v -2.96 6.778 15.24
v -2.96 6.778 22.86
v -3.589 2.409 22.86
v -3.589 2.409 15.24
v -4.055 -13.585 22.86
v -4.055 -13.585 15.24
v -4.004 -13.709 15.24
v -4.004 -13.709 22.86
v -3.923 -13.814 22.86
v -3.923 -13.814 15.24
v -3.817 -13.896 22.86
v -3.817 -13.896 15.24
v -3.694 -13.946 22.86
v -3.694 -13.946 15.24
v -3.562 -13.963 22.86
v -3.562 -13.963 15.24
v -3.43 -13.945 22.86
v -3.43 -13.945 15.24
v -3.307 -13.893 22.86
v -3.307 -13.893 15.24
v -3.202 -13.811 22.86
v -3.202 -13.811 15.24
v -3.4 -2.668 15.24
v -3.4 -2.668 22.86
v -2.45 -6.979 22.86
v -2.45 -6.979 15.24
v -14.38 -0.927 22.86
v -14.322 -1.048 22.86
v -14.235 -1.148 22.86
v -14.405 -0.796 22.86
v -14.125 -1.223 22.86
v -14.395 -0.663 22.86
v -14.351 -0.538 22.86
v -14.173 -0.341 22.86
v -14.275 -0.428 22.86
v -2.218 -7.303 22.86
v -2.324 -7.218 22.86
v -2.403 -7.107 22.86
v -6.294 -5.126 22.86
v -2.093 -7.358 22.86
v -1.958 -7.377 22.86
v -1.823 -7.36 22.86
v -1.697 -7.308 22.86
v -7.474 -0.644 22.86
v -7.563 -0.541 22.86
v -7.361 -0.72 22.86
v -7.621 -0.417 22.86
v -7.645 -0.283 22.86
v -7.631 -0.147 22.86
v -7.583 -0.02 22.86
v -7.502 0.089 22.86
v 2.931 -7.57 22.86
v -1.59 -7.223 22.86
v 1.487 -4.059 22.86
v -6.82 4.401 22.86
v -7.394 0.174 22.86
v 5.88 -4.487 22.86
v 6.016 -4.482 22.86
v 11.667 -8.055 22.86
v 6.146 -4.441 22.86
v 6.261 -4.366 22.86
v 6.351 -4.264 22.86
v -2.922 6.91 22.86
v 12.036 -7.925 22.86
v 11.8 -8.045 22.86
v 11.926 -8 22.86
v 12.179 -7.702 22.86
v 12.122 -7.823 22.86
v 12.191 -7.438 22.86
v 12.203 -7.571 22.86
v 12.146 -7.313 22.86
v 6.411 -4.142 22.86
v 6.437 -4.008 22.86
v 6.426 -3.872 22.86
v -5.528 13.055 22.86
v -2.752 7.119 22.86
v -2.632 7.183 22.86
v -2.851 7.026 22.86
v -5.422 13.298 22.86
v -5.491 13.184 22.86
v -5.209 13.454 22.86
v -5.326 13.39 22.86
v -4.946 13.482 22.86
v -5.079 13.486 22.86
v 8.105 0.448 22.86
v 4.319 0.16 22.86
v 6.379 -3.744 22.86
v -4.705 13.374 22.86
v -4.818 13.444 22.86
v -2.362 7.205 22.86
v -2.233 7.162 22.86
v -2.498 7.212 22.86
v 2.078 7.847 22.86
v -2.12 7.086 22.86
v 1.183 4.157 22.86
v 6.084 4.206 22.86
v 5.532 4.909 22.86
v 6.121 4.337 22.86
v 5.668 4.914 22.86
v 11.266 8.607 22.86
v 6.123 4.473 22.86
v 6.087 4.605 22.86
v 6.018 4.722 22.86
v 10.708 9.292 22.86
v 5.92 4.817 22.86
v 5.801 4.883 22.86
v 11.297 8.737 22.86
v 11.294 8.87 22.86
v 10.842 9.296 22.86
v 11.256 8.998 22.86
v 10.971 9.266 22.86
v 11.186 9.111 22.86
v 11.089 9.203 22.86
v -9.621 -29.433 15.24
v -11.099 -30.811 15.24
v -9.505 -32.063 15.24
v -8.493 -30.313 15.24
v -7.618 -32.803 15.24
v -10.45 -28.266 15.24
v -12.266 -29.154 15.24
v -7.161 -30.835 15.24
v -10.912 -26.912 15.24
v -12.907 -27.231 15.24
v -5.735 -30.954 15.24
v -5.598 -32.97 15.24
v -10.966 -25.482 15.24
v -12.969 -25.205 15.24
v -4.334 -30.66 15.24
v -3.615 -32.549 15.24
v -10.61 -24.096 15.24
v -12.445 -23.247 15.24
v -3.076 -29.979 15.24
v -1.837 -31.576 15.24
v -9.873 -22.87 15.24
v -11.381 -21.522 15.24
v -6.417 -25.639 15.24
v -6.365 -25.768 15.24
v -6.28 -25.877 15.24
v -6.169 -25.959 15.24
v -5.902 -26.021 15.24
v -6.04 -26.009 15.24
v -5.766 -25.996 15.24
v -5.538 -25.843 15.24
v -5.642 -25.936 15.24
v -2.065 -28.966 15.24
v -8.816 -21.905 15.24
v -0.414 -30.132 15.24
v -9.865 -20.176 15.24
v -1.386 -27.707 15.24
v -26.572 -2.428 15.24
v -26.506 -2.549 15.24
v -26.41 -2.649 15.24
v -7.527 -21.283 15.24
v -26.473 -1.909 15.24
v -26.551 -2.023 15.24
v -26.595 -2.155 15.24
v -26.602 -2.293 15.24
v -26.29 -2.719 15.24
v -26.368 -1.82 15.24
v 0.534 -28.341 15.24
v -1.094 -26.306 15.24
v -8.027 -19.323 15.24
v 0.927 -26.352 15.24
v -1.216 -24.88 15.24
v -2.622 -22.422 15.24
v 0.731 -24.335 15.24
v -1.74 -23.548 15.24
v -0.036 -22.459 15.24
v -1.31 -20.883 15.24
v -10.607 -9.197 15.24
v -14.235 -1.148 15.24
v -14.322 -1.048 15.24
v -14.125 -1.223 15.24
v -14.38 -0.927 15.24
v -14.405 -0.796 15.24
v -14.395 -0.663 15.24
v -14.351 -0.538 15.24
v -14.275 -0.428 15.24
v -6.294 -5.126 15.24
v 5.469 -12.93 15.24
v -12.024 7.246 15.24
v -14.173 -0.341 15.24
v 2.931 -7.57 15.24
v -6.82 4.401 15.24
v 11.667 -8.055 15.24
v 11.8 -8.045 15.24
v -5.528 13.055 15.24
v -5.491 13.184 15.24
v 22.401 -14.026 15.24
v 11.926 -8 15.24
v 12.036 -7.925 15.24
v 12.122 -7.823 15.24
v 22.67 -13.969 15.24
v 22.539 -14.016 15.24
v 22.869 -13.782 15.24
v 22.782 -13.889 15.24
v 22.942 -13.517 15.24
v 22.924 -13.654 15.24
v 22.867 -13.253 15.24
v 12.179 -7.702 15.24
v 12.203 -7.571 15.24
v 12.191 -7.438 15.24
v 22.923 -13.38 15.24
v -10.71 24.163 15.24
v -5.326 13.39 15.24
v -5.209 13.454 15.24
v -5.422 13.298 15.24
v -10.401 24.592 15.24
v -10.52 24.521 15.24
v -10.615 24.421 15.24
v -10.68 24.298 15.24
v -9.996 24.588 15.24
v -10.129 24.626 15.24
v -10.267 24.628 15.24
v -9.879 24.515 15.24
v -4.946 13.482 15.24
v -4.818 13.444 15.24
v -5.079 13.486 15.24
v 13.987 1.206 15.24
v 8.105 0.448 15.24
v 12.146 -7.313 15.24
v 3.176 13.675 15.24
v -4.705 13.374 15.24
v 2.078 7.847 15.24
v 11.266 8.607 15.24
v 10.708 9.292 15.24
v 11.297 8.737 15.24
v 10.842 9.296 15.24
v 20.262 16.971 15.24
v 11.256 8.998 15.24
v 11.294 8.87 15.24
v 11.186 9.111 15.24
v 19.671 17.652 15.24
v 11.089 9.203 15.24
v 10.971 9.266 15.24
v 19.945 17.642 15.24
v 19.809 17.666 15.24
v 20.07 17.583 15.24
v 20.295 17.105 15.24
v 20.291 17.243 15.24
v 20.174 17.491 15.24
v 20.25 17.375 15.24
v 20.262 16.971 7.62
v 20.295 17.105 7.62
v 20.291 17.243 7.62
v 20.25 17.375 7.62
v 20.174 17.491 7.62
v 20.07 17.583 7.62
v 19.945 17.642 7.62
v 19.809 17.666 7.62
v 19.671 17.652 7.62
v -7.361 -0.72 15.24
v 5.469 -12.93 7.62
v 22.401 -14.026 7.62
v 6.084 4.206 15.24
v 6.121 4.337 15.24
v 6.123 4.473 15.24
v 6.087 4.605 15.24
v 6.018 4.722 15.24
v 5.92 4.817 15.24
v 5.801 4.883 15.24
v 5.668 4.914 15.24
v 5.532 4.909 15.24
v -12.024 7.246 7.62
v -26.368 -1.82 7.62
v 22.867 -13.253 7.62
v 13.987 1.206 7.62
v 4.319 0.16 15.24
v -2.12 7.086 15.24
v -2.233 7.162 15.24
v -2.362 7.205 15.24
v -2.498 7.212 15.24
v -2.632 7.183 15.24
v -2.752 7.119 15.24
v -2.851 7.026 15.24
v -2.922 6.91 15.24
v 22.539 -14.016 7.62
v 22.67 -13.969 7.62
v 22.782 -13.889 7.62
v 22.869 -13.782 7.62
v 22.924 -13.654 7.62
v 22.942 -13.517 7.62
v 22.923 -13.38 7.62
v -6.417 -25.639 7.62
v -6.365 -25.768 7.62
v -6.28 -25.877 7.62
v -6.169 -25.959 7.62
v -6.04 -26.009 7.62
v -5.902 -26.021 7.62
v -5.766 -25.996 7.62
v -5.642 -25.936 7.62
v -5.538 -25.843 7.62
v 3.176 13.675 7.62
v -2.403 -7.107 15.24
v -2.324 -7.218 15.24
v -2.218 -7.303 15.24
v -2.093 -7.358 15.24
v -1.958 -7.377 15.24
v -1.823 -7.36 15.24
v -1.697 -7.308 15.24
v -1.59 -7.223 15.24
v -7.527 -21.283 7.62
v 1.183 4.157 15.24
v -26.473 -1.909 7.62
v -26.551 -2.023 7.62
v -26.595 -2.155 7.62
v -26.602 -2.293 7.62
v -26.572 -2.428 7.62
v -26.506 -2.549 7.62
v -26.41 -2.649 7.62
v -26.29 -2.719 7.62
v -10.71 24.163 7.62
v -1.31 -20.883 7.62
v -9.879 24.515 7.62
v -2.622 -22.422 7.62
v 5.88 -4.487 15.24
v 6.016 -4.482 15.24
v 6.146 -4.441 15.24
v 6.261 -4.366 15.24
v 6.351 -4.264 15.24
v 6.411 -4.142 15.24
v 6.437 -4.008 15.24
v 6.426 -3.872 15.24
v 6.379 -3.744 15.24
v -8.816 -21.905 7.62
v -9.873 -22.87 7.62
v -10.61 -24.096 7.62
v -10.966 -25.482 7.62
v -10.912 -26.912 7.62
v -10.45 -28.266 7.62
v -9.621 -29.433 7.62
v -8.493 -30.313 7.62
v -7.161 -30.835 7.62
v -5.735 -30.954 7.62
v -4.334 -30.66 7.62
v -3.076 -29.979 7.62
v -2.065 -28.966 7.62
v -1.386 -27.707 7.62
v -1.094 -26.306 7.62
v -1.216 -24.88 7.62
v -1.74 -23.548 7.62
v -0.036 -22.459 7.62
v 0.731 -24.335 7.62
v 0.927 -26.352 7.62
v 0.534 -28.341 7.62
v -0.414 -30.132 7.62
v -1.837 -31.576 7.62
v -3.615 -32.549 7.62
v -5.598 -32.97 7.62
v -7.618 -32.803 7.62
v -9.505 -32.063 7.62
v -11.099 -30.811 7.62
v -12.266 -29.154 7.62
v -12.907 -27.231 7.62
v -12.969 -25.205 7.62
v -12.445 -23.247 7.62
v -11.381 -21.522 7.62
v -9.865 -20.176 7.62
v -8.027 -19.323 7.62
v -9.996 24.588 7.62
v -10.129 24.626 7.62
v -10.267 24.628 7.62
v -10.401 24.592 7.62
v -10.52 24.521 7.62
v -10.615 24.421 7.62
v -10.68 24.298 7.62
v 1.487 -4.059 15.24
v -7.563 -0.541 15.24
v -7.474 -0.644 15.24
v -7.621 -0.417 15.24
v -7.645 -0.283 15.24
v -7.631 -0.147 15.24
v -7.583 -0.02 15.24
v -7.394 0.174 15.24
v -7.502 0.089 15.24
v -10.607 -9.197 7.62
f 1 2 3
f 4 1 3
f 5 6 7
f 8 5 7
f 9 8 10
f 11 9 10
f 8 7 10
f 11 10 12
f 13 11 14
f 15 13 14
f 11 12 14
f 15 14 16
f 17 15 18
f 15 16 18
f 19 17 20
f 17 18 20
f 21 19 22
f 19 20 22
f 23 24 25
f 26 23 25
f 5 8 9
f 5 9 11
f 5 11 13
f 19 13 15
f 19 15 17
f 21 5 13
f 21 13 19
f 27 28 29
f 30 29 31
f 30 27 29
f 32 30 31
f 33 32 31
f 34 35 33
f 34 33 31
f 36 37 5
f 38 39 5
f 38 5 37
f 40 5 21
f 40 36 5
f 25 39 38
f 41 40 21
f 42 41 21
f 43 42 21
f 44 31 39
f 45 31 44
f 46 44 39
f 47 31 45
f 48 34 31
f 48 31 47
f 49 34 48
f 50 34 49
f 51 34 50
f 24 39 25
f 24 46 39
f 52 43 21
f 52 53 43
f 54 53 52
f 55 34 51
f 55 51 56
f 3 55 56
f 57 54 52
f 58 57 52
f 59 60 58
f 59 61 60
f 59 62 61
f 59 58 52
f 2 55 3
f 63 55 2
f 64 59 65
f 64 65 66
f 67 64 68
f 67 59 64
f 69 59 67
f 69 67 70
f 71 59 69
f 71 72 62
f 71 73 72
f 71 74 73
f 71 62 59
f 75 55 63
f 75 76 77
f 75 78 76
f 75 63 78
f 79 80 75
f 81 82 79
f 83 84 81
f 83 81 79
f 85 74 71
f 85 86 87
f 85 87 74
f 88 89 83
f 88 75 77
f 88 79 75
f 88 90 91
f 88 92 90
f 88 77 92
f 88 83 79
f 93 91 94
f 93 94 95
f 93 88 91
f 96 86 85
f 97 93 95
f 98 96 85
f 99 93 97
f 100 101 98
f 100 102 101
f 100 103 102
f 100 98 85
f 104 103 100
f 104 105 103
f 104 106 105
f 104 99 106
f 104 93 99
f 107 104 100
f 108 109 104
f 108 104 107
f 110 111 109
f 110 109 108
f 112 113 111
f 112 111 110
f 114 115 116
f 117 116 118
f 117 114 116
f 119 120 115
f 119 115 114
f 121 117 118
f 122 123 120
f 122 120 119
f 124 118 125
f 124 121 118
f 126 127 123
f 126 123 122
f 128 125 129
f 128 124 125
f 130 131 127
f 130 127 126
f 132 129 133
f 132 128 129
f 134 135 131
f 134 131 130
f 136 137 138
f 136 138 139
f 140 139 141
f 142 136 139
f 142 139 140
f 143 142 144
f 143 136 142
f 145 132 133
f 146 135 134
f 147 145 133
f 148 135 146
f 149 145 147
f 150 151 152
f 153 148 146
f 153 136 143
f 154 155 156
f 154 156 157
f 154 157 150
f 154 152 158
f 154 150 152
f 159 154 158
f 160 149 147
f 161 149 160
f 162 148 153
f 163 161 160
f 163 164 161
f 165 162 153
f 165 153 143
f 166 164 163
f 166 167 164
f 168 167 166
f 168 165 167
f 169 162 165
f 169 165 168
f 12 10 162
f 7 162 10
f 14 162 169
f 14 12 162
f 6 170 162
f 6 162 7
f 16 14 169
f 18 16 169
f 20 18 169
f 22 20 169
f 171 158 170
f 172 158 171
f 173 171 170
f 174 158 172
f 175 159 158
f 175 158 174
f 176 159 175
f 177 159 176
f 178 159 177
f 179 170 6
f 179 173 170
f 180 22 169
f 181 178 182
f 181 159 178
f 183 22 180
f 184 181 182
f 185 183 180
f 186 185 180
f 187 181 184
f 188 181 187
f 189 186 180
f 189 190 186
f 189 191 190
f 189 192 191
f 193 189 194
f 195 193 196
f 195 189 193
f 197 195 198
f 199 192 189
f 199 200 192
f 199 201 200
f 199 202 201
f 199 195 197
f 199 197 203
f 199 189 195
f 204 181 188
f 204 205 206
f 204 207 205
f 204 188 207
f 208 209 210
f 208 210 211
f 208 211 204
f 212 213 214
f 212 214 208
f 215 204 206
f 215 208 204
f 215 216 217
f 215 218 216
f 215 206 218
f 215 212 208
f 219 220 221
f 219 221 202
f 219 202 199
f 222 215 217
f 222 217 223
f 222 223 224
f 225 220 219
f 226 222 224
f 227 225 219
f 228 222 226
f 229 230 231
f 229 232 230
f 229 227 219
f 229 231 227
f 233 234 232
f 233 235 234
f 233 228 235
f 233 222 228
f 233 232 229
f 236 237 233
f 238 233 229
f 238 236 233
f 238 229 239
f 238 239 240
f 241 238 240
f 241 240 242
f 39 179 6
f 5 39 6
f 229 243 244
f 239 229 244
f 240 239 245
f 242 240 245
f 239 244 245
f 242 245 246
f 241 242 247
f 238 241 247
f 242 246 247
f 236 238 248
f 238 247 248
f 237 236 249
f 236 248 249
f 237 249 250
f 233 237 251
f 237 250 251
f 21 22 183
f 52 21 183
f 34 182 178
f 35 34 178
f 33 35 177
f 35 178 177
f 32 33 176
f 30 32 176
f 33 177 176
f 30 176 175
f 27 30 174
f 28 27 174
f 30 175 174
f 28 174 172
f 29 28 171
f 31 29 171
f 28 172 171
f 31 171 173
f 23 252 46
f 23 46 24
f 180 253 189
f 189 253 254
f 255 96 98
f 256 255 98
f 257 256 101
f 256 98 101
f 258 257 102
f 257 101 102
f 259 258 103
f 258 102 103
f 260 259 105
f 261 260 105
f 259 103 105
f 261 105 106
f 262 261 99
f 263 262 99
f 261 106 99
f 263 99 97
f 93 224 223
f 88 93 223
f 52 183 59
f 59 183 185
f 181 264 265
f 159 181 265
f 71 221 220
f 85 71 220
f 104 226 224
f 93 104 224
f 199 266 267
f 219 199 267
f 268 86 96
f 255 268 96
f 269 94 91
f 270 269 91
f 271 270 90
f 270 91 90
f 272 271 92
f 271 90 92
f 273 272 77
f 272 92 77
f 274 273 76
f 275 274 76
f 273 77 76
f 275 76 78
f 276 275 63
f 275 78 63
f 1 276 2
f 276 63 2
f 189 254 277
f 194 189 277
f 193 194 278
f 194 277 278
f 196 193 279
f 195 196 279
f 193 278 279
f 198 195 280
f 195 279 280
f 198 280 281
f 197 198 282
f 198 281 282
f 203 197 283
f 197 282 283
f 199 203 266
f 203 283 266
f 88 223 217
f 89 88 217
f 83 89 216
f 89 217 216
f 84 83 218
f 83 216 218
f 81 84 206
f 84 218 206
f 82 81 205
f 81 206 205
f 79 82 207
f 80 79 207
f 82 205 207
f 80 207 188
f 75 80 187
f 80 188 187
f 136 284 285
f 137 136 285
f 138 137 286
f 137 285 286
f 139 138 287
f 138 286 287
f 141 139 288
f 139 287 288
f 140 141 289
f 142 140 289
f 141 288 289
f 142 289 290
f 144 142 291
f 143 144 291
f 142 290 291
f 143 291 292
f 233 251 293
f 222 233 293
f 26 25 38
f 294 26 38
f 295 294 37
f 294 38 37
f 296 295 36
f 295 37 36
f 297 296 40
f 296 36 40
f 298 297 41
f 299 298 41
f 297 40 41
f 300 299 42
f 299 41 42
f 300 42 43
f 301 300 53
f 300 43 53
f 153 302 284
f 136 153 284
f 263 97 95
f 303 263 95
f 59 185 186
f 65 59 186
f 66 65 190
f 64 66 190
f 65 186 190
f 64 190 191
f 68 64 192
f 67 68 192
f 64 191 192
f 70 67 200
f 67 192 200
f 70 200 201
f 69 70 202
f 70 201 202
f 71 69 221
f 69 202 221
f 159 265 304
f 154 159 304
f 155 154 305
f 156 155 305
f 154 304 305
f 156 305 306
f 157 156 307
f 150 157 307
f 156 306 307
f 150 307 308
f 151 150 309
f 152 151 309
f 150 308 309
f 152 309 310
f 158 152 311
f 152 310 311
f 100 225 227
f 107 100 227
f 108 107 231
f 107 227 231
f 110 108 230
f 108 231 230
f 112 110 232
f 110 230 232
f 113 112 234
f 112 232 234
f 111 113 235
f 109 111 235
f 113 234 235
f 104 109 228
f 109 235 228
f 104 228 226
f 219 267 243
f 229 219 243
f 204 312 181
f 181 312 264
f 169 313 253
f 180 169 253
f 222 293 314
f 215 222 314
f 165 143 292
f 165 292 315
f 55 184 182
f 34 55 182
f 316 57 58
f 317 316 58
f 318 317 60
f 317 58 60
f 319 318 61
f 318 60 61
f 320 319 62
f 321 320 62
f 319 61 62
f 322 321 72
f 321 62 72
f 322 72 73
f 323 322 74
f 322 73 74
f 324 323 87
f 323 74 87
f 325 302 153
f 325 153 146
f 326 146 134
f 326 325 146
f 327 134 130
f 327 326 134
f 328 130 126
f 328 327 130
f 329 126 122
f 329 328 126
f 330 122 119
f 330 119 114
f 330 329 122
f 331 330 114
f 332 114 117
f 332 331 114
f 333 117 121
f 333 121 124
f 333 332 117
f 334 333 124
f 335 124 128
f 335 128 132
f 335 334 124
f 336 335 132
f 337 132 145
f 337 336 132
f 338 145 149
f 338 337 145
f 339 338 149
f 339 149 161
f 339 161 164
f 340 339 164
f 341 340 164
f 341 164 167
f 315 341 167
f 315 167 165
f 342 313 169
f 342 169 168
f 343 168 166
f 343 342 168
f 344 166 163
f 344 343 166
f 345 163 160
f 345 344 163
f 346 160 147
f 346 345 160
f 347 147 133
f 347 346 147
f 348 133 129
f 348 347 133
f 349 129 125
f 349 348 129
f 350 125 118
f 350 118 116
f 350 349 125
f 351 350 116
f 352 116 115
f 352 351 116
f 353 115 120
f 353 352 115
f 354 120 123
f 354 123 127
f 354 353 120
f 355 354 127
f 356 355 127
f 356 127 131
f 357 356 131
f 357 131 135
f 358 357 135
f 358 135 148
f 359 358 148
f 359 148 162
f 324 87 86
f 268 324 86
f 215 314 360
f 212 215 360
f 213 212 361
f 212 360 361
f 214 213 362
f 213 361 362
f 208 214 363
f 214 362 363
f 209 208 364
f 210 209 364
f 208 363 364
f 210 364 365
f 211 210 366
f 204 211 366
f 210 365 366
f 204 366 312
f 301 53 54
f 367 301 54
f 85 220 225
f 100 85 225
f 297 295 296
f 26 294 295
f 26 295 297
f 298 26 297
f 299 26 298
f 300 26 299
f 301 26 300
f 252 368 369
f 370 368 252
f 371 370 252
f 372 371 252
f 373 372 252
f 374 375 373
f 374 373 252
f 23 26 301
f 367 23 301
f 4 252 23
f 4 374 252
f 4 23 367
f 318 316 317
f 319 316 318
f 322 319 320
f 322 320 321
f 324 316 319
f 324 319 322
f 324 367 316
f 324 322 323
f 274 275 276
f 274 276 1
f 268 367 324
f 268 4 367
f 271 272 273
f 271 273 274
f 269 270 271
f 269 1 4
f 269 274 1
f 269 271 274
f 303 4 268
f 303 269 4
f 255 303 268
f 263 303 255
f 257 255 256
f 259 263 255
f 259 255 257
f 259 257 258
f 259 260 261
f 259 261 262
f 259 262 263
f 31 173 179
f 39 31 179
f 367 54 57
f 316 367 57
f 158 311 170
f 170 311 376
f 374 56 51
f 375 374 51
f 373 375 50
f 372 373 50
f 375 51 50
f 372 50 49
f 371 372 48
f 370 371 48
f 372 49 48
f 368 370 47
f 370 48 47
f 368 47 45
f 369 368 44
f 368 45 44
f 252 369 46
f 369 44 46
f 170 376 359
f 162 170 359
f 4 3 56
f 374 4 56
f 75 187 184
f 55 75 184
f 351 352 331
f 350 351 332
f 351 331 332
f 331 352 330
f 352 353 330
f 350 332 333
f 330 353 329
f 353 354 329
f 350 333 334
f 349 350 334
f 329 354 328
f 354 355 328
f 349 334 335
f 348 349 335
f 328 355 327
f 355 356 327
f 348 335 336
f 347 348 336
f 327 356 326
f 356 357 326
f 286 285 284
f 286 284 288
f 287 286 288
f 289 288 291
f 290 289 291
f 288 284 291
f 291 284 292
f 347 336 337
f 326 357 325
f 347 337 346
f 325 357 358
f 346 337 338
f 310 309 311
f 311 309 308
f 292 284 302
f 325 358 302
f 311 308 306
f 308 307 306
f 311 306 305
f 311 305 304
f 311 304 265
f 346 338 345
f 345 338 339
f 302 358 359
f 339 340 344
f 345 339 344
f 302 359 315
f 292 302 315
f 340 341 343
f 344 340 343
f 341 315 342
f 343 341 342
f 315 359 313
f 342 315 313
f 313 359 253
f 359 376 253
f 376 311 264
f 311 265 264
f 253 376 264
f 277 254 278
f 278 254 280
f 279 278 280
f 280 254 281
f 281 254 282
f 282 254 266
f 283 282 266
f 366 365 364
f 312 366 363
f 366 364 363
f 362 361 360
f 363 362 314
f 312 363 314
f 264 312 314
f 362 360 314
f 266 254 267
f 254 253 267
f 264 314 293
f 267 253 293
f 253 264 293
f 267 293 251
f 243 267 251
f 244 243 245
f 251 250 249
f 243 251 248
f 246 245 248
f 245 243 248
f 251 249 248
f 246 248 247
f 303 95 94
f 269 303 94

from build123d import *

# Parameters (mm, degrees)
F1_DEPTH  = 7.62
F3_DEPTH  = 7.62
F5_DEPTH  = 7.62
F8_DEPTH  = 7.62
F10_DEPTH = 7.62
F12_DEPTH = 7.62


# Not quite as in the source:
# - a feature names something its author has since deleted; it is built from what else it names


with BuildPart() as f1:
    # F0 (on Top) → F1 (new body)
    with BuildSketch(Plane.XY):
        with BuildLine():
            Line((5.2457718421, 22.65034753), (-16.6286527122, 42.176813326))
            ThreePointArc((-16.6286527122, 42.176813326), (-17.1554325452, 42.2695789476), (-17.4732486395, 41.8393518177))
            Line((-17.4732486395, 41.8393518177), (-19.9207279669, 11.9883678087))
            Line((-19.9207279669, 11.9883678087), (-45.2510694319, -2.7814364328))
            ThreePointArc((-45.2510694319, -2.7814364328), (-45.5020787015, -3.2537676721), (-45.1911189603, -3.6889762341))
            Line((-45.1911189603, -3.6889762341), (-17.5574588063, -15.2411287545))
            Line((-17.5574588063, -15.2411287545), (-11.338046224, -43.895835579))
            ThreePointArc((-11.338046224, -43.895835579), (-10.9663986511, -44.2805179605), (-10.4563988677, -44.1192645141))
            Line((-10.4563988677, -44.1192645141), (9.0696216685, -21.4079034059))
            Line((9.0696216685, -21.4079034059), (38.2437714994, -24.3476819196))
            ThreePointArc((38.2437714994, -24.3476819196), (38.724471601, -24.1130974669), (38.7287090602, -23.5782287943))
            Line((38.7287090602, -23.5782287943), (23.1627932625, 2.0103168218))
            Line((23.1627932625, 2.0103168218), (34.9739968686, 28.8481406054))
            ThreePointArc((34.9739968686, 28.8481406054), (34.8994382969, 29.3778041519), (34.3920574073, 29.5471177247))
            Line((34.3920574073, 29.5471177247), (5.2457718421, 22.65034753))
        make_face()
    extrude(amount=F1_DEPTH)

    # F2 (on face) → F3 (join)
    with BuildSketch(Plane.XY.offset(7.62)):
        with BuildLine():
            Line((-10.7096949682, 24.1632334685), (-12.0244422161, 7.2461689852))
            Line((-12.0244422161, 7.2461689852), (-26.367554987, -1.8197422817))
            ThreePointArc((-26.367554987, -1.8197422817), (-26.6022582168, -2.2927760227), (-26.2900783947, -2.7186754062))
            Line((-26.2900783947, -2.7186754062), (-10.6072732242, -9.1967347639))
            Line((-10.6072732242, -9.1967347639), (-6.4173448361, -25.6393662796))
            ThreePointArc((-6.4173448361, -25.6393662796), (-6.0399903009, -26.0087577805), (-5.5384670466, -25.8434672739))
            Line((-5.5384670466, -25.8434672739), (5.4687868356, -12.9300636548))
            Line((5.4687868356, -12.9300636548), (22.4014177608, -14.026257529))
            ThreePointArc((22.4014177608, -14.026257529), (22.8693389191, -13.7815202908), (22.8671175143, -13.2534657562))
            Line((22.8671175143, -13.2534657562), (13.9871693659, 1.2055159485))
            Line((13.9871693659, 1.2055159485), (20.2621824084, 16.9706623917))
            ThreePointArc((20.2621824084, 16.9706623917), (20.1740190532, 17.4913098242), (19.6711228952, 17.6523749678))
            Line((19.6711228952, 17.6523749678), (3.1757592389, 13.675113485))
            Line((3.1757592389, 13.675113485), (-9.8787003461, 24.5147036987))
            ThreePointArc((-9.8787003461, 24.5147036987), (-10.4011094545, 24.5917442699), (-10.7096949682, 24.1632334685))
        make_face()
    extrude(amount=F3_DEPTH)

    # F4 (on face) → F5 (join)
    with BuildSketch(Plane.XY.offset(15.24)):
        with BuildLine():
            ThreePointArc((-4.7045563215, 13.3742015157), (-5.2088793669, 13.454135563), (-5.5278964741, 13.0554385961))
            Line((-5.5278964741, 13.0554385961), (-6.8203753298, 4.4014452639))
            Line((-6.8203753298, 4.4014452639), (-14.1734093561, -0.3414433913))
            ThreePointArc((-14.1734093561, -0.3414433913), (-14.4052755444, -0.7963821309), (-14.1246739036, -1.2229895678))
            Line((-14.1246739036, -1.2229895678), (-6.2936350842, -5.1264410146))
            Line((-6.2936350842, -5.1264410146), (-4.0550923971, -13.5852251368))
            ThreePointArc((-4.0550923971, -13.5852251368), (-3.6940705368, -13.946326788), (-3.2016320784, -13.811287717))
            Line((-3.2016320784, -13.811287717), (2.9306949349, -7.5697600522))
            Line((2.9306949349, -7.5697600522), (11.6672244272, -8.0546874881))
            ThreePointArc((11.6672244272, -8.0546874881), (12.1222143958, -7.8229218423), (12.1459564597, -7.3128556696))
            Line((12.1459564597, -7.3128556696), (8.1049041646, 0.4480720157))
            Line((8.1049041646, 0.4480720157), (11.2658336475, 8.6071545004))
            ThreePointArc((11.2658336475, 8.6071545004), (11.1860110523, 9.1114951981), (10.7082459963, 9.2916943583))
            Line((10.7082459963, 9.2916943583), (2.0784113144, 7.8466837873))
            Line((2.0784113144, 7.8466837873), (-4.7045563215, 13.3742015157))
        make_face()
    extrude(amount=F5_DEPTH)

    # F8 (cut): a face of the model
    f8_faces = [f1.faces().sort_by_distance(p)[0] for p in [
        (0, 0, 0),
    ]]
    extrude(f8_faces, amount=-F8_DEPTH, mode=Mode.SUBTRACT)

    # F9 (on face) → F10 (cut)
    with BuildSketch(Plane.XY.offset(22.86)):
        with BuildLine():
            ThreePointArc((-2.1197789922, 7.0861071574), (-2.6315872512, 7.1830271414), (-2.9596514058, 6.77840993))
            Line((-2.9596514058, 6.77840993), (-3.5885418896, 2.4094997361))
            Line((-3.5885418896, 2.4094997361), (-7.3943361202, 0.173697912))
            ThreePointArc((-7.3943361202, 0.173697912), (-7.6446699524, -0.2831107457), (-7.3612335158, -0.7201518922))
            Line((-7.3612335158, -0.7201518922), (-3.400490854, -2.6683297817))
            Line((-3.400490854, -2.6683297817), (-2.4501720543, -6.9787559441))
            ThreePointArc((-2.4501720543, -6.9787559441), (-2.0930786121, -7.3579992049), (-1.5898411061, -7.2234882764))
            Line((-1.5898411061, -7.2234882764), (1.4869229634, -4.0586182344))
            Line((1.4869229634, -4.0586182344), (5.8800465123, -4.4868062846))
            ThreePointArc((5.8800465123, -4.4868062846), (6.351076229, -4.2643828521), (6.3786576755, -3.7442093799))
            Line((6.3786576755, -3.7442093799), (4.319459784, 0.1599657655))
            Line((4.319459784, 0.1599657655), (6.0842406543, 4.2057571592))
            ThreePointArc((6.0842406543, 4.2057571592), (6.0182595868, 4.7224656612), (5.5320683522, 4.9094396186))
            Line((5.5320683522, 4.9094396186), (1.1826499962, 4.1574825145))
            Line((1.1826499962, 4.1574825145), (-2.1197789922, 7.0861071574))
        make_face()
    extrude(amount=-F10_DEPTH, mode=Mode.SUBTRACT)

    # F11 (on face) → F12 (join)
    with BuildSketch(Plane(origin=(0, 0, 7.62), x_dir=(1, 0, 0), z_dir=(0, 0, -1))):
        with BuildLine():
            Line((-2.6220134118, 22.4219651148), (-1.3098667841, 20.8825912445))
            ThreePointArc((-1.3098667841, 20.8825912445), (-7.6178176155, 32.8030283673), (-8.0269681328, 19.3226848722))
            Line((-8.0269681328, 19.3226848722), (-7.5274974689, 21.282768988))
            ThreePointArc((-7.5274974689, 21.282768988), (-7.1607580244, 30.8348874257), (-2.6220134118, 22.4219651148))
        make_face()
    extrude(amount=-F12_DEPTH)


solid = f1.part
